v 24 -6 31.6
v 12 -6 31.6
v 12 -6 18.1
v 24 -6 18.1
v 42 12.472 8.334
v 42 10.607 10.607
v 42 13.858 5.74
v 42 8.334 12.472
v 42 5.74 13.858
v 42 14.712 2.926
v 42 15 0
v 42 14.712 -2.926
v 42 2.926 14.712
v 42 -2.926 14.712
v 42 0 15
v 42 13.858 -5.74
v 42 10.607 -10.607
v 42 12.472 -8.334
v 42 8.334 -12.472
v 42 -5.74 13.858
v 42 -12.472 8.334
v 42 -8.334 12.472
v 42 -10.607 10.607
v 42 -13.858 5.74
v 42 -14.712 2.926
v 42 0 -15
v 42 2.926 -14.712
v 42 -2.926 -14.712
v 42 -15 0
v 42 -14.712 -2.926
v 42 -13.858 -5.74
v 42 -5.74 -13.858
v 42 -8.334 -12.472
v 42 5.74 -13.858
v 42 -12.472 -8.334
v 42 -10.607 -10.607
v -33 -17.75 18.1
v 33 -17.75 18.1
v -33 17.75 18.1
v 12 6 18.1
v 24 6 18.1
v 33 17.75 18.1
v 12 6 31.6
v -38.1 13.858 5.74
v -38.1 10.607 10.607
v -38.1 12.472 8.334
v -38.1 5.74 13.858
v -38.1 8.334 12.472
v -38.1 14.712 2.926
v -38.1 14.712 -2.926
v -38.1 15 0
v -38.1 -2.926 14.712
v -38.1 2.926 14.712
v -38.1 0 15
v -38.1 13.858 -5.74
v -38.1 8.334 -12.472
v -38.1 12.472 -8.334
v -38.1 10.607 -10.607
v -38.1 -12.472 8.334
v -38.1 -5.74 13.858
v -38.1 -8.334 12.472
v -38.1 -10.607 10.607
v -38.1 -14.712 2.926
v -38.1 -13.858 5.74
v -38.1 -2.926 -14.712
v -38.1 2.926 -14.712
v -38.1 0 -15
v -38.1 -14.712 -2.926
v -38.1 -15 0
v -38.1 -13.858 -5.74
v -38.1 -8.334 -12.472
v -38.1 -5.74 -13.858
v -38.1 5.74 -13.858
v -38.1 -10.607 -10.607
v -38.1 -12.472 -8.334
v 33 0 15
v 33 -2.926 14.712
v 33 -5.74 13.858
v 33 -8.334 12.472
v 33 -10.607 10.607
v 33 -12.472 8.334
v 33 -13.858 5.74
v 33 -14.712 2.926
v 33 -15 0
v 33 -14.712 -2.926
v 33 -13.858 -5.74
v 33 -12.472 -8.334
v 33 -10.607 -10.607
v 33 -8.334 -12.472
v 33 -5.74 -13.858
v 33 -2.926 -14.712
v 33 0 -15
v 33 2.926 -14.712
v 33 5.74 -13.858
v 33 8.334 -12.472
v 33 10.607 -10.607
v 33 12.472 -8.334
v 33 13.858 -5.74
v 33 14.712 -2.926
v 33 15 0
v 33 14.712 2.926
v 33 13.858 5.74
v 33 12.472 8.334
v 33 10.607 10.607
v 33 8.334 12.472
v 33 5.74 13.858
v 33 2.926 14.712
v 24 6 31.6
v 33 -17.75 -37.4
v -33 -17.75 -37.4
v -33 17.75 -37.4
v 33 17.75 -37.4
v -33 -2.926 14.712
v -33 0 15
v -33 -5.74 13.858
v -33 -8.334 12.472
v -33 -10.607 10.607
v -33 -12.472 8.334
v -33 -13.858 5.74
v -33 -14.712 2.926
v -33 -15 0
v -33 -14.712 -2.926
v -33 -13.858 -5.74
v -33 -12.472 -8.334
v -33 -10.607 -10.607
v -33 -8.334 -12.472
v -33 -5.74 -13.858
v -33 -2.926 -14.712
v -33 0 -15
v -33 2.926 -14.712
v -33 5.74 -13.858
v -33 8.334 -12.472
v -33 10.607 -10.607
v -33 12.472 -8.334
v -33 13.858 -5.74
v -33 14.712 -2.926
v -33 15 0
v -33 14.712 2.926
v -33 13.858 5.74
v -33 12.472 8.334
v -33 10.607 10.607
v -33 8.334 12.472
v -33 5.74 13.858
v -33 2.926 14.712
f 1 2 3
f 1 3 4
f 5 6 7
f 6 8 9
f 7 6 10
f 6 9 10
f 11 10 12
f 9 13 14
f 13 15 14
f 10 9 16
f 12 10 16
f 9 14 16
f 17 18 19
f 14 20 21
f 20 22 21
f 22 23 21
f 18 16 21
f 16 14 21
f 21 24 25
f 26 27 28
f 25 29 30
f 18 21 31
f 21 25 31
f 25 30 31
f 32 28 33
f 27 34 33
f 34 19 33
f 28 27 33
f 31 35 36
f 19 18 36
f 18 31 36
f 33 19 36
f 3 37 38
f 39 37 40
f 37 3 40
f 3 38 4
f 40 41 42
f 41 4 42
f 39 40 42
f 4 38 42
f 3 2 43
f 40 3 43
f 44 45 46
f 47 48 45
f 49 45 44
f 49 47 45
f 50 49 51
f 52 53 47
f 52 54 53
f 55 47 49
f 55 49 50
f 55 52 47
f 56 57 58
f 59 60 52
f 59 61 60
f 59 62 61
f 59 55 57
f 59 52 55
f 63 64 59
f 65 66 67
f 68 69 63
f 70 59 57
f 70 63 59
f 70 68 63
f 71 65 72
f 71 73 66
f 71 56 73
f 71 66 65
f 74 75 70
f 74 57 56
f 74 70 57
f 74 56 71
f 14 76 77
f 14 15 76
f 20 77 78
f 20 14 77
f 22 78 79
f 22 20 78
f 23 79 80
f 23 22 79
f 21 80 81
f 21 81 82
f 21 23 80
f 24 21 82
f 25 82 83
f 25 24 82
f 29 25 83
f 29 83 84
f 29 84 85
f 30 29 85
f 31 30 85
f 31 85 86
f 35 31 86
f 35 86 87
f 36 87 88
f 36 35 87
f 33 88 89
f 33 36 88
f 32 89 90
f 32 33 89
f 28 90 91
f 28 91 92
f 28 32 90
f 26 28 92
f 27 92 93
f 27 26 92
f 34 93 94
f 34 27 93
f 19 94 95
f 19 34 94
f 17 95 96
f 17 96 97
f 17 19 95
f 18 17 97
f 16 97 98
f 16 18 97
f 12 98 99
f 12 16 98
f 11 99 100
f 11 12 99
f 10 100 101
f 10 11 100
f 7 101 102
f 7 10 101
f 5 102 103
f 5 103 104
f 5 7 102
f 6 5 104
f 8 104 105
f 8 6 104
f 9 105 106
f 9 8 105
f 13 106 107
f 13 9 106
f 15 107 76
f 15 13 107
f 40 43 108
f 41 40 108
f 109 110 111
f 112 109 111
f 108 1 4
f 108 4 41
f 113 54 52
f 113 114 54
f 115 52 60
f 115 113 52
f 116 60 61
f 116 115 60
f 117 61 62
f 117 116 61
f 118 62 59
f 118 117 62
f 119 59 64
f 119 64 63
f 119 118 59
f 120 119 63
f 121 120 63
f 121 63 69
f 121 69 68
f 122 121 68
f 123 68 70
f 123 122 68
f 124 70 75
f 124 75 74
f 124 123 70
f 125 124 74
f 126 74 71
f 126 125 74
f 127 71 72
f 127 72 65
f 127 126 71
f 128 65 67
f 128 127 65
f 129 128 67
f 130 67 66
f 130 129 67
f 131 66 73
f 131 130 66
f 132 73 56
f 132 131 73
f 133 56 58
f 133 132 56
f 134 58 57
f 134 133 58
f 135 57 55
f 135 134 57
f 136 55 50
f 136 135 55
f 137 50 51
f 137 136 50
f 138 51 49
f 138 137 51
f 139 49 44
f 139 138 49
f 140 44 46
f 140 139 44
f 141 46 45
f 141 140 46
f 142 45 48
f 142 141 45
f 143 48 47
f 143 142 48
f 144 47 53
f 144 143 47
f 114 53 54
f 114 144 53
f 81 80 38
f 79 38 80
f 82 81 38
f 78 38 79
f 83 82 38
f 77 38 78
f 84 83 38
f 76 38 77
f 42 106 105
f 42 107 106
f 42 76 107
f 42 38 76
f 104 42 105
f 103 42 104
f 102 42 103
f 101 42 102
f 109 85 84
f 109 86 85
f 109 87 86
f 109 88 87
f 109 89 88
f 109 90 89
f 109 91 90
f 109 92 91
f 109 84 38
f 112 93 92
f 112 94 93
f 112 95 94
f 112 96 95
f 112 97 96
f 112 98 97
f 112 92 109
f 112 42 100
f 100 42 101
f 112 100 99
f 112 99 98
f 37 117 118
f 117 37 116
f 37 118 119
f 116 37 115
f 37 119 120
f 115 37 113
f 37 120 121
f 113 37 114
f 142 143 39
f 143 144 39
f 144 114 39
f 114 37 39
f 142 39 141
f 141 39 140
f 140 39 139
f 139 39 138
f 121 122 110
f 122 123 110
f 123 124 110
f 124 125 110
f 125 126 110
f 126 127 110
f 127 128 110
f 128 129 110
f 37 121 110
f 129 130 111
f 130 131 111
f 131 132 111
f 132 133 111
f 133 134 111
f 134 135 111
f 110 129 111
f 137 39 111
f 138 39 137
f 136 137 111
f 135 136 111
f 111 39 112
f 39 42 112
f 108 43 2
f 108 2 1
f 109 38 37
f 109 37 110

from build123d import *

# Parameters (mm, degrees)
SKETCH_1_W        = 55.5
SKETCH_1_H        = 35.5
EXTRUDE_764_DEPTH = 33
SKETCH_2_W        = 9
SKETCH_2_H        = 15
SKETCH_3_W        = 5.1
SKETCH_3_H        = 15
SKETCH_4_W        = 12
SKETCH_4_H        = 12
EXTRUDE_919_DEPTH = 31.6


with BuildPart() as part:
    # ｽｹｯﾁ1 → Extrude 764 (new, symmetric)
    with BuildSketch(Plane(origin=(0, 0, 0), x_dir=(0, 0, -1), z_dir=(1, 0, 0))):
        with Locations((9.65, 0)):
            Rectangle(SKETCH_1_W, SKETCH_1_H)
    extrude(amount=EXTRUDE_764_DEPTH, both=True)

    # ｽｹｯﾁ2 → Revolve 816 (revolve)
    with BuildSketch(Plane.XY):
        with Locations((37.5, 7.5)):
            Rectangle(SKETCH_2_W, SKETCH_2_H)
    revolve(axis=Axis((0, 0, 0), (1, 0, 0)))

    # ｽｹｯﾁ3 → Revolve 870 (revolve)
    with BuildSketch(Plane.XY):
        with Locations((-35.55, 7.5)):
            Rectangle(SKETCH_3_W, SKETCH_3_H)
    revolve(axis=Axis((0, 0, 0), (1, 0, 0)))

    # ｽｹｯﾁ4 → Extrude 919 (add, symmetric)
    with BuildSketch(Plane.XY):
        with Locations((18, 0)):
            Rectangle(SKETCH_4_W, SKETCH_4_H)
    extrude(amount=EXTRUDE_919_DEPTH, both=True)


solid = part.part
